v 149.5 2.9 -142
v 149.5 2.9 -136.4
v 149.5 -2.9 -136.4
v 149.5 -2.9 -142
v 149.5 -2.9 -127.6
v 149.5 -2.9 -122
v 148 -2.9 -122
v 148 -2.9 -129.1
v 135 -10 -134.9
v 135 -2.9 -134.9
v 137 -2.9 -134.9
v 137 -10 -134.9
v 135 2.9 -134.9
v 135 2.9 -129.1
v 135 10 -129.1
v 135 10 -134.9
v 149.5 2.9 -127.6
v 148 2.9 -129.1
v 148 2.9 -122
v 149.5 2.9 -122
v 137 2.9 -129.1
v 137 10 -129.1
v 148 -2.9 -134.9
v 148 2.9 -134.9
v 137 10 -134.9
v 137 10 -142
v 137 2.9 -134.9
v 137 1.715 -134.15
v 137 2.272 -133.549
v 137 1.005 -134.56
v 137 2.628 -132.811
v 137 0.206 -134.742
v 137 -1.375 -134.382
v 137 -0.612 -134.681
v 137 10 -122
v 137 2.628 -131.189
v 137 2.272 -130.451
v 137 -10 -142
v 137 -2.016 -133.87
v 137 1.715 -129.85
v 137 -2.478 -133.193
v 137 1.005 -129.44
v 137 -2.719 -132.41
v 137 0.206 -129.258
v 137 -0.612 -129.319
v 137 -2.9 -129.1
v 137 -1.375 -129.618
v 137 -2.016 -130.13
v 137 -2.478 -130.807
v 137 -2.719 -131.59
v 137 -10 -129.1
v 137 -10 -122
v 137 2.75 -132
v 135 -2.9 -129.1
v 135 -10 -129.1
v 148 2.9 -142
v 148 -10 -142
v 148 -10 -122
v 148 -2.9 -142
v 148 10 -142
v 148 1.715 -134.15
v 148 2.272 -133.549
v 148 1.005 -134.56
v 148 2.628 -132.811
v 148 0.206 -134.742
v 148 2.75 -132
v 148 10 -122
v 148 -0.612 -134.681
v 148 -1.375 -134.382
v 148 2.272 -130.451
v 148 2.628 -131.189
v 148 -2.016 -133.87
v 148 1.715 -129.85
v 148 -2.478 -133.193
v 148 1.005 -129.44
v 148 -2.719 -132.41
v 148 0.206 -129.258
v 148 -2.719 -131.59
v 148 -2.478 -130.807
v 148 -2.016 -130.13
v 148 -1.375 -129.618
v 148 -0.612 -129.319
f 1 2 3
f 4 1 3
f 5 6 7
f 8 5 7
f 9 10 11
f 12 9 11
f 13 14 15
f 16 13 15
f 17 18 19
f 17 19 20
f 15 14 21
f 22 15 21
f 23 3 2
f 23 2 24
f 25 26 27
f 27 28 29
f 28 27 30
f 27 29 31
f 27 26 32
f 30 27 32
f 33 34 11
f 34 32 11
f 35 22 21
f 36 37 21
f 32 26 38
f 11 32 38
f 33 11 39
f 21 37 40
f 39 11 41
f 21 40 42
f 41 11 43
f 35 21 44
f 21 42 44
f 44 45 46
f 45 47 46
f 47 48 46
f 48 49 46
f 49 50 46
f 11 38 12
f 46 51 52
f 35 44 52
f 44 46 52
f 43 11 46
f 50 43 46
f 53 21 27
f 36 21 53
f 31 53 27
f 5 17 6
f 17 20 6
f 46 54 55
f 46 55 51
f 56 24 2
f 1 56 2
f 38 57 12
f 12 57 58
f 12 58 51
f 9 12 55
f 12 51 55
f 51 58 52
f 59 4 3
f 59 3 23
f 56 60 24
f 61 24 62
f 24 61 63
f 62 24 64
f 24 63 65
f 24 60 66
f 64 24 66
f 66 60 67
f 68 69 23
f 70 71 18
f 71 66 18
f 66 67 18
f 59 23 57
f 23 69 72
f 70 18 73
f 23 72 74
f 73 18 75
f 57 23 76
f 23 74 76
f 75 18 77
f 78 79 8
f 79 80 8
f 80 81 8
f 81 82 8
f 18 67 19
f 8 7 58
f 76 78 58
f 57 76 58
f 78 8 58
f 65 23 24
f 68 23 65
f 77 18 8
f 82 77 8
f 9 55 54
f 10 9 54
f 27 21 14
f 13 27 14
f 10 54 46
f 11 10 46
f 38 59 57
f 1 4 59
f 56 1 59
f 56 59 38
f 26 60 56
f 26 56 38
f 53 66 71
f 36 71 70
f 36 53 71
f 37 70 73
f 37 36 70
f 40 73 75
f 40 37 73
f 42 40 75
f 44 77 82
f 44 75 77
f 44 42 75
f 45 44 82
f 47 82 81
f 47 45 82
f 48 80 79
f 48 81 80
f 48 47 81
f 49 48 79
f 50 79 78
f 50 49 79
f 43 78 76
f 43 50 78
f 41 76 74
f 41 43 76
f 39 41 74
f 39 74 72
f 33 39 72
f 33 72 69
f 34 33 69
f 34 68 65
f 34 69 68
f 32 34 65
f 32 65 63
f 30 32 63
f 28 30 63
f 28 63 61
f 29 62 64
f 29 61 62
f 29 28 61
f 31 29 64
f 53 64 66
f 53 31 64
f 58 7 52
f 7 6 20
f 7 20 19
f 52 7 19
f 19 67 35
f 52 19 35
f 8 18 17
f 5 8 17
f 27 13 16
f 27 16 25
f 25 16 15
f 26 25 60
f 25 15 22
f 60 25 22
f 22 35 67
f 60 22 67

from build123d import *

# Parameters (mm, degrees)
PAD035_DEPTH         = 10
SKETCH097_W          = 2
SKETCH097_H          = 7.1
POCKET055_DEPTH      = 10.001
POCKET055_DEPTH_BACK = 10.001
SKETCH098_R          = 2.75
POCKET056_DEPTH      = 2.001
POCKET056_DEPTH_BACK = 12.501


with BuildPart() as part:
    # Sketch096 → Pad035 (new body, symmetric)
    with BuildSketch(Plane.XY):
        Polygon((-2, 10), (11, 10), (11, 2.9), (12.5, 2.9), (12.5, -2.9), (11, -2.9), (11, -10), (-2, -10), (-2, -2.9), (0, -2.9), (0, 2.9), (-2, 2.9), align=None)
    extrude(amount=PAD035_DEPTH, both=True)

    # Sketch097 → Pocket055 (cut, two sides)
    with BuildSketch(Plane.XZ) as pocket055_sk:
        with Locations((-1, -6.45)):
            Rectangle(SKETCH097_W, SKETCH097_H)
        with Locations((-1, 6.45)):
            Rectangle(SKETCH097_W, SKETCH097_H)
        Polygon((11, 2.9), (12.5, 4.4), (12.5, -4.4), (11, -2.9), align=None)
    extrude(amount=-POCKET055_DEPTH, mode=Mode.SUBTRACT)
    extrude(pocket055_sk.sketch, amount=POCKET055_DEPTH_BACK, mode=Mode.SUBTRACT)

    # Sketch098 → Pocket056 (cut, two sides)
    with BuildSketch(Plane.YZ) as pocket056_sk:
        Circle(SKETCH098_R)
    extrude(amount=-POCKET056_DEPTH, mode=Mode.SUBTRACT)
    extrude(pocket056_sk.sketch, amount=POCKET056_DEPTH_BACK, mode=Mode.SUBTRACT)


with BuildPart() as part_1:
    # Body022016 placement: moved
    add(part.part.moved(Location((137, 0, -132))))


solid = part_1.part
